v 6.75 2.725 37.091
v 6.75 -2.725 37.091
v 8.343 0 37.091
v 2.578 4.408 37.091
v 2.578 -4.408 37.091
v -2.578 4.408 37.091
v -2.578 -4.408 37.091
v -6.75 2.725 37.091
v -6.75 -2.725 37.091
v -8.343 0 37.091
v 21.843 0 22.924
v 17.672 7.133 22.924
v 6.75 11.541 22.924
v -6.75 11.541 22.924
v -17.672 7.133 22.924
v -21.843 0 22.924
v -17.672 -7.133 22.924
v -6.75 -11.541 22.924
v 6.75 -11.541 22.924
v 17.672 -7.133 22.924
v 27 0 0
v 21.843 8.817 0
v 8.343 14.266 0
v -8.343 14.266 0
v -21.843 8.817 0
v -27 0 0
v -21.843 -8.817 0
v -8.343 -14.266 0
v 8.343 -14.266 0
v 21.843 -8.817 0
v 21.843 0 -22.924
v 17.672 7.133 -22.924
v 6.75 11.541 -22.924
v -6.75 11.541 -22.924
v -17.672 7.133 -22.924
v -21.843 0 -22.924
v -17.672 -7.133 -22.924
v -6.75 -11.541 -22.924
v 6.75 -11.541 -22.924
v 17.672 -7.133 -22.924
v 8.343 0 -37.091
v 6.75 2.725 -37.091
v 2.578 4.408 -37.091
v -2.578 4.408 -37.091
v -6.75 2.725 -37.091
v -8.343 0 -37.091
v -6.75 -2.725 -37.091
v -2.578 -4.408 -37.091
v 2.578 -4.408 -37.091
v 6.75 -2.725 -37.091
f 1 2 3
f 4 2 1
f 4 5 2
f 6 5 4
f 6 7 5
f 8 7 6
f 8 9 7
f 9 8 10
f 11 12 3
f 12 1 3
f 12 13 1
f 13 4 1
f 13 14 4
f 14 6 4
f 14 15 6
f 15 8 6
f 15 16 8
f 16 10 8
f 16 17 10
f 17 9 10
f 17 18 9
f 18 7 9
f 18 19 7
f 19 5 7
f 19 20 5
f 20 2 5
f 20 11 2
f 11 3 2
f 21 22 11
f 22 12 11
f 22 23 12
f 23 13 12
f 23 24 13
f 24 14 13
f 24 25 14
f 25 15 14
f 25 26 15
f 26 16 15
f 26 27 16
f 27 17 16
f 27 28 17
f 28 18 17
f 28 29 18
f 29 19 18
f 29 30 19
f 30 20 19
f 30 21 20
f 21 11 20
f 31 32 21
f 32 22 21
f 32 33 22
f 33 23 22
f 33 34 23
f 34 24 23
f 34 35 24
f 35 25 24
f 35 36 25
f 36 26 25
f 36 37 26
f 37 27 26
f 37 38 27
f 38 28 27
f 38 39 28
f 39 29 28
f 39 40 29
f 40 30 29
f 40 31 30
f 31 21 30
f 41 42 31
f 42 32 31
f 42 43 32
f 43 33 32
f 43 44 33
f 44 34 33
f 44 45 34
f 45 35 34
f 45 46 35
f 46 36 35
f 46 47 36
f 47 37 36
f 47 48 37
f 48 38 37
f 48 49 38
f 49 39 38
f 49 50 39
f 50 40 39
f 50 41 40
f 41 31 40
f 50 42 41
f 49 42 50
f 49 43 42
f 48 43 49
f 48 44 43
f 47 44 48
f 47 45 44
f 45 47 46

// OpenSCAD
// Generated by SolidPython 1.0.1 on 2020-07-29 00:46:48


scale(v = [9, 5, 13]) {
	sphere(r = 3);
}
/***********************************************
*********      SolidPython code:      **********
************************************************
 
# import packages: SolidPython
from solid import *
from solid.utils import *
from itertools import chain, combinations, permutations


class Resize:

    def __init__(self, scad_file):
        self.scad_file = scad_file
        #self.scad_file = import_scad(scad_file)
        # cone/cylinder param:
        self.r1 = 0
        self.r2 = 0
        self.h = 0
        # rectangular prism param:
        self.w = 0
        self.l = 0
        # ellipse param:
        self.r = 0

    # import OpenScad code (file name corresponds to shape)


    # classify shape + parameters
    def assign(self, param1, param2, param3):
        if self.scad_file == 'cone.scad':
            self.r1 = param1
            self.r2 = param2
            self.h = param3
        elif self.scad_file == 'cylinder.scad':
            self.r1 = param1
            self.r2 = param2
            self.h = param3
        elif self.scad_file == 'rectangularPrism.scad':
            self.h = param1
            self.l = param2
            self.w = param3
        else:
            self.r = param1
            self.h = param2

    # resize parameters
    def iterate(self):
        x = range(3, 20, 2)
        i = 1
        if self.scad_file == 'cone.scad':
            tempList = list(permutations(x, 2))
            for temp in tempList:
                param1 = temp[0]
                param2 = temp[1]
                filepath = 'produced_scad_files/' + 'cone' + str(param1) + '_' + str(param2) + '_' + '.scad'
                scad_render_to_file(cylinder(h=param1, r1=param2, r2=0), filepath)

        elif self.scad_file == 'cylinder.scad':
            tempList = list(permutations(x, 3))
            for temp in tempList:
                param1 = temp[0]
                param2 = temp[1]
                filepath = 'produced_scad_files/' + 'cylinder' + str(param1) + '_' + str(param2) + '_' + '.scad'
                scad_render_to_file(cylinder(h=param1, r1=param2, r2=param2), filepath)

        elif self.scad_file == 'rectangularPrism.scad':
            tempList = list(permutations(x, 3))
            for temp in tempList:
                param1 = temp[0]
                param2 = temp[1]
                param3 = temp[2]
                filepath = 'produced_scad_files/' + 'rectangularPrism' + str(param1) + '_' + str(param2) + '_' + str(
                    param3) + '.scad'
                scad_render_to_file(cube(size=(param1, param2, param3)), filepath)

        elif self.scad_file == 'ellipse.scad':
            tempList = list(permutations(x, 4))
            for temp in tempList:
                param1 = temp[0]
                param2 = temp[1]
                param3 = temp[2]
                param4 = temp[3]
                filepath = 'produced_scad_files/' + 'ellipse' + str(param1) + '_' + str(param2) + '_' + str(param3) + '_' + str(param4) + '.scad'
                scad_render_to_file(scale([param1, param2, param3])(sphere(r=param4)), filepath)

    def render_to_scadfile(self):
        scad_render_to_file(scad, 'example.scad') 
 
************************************************/
